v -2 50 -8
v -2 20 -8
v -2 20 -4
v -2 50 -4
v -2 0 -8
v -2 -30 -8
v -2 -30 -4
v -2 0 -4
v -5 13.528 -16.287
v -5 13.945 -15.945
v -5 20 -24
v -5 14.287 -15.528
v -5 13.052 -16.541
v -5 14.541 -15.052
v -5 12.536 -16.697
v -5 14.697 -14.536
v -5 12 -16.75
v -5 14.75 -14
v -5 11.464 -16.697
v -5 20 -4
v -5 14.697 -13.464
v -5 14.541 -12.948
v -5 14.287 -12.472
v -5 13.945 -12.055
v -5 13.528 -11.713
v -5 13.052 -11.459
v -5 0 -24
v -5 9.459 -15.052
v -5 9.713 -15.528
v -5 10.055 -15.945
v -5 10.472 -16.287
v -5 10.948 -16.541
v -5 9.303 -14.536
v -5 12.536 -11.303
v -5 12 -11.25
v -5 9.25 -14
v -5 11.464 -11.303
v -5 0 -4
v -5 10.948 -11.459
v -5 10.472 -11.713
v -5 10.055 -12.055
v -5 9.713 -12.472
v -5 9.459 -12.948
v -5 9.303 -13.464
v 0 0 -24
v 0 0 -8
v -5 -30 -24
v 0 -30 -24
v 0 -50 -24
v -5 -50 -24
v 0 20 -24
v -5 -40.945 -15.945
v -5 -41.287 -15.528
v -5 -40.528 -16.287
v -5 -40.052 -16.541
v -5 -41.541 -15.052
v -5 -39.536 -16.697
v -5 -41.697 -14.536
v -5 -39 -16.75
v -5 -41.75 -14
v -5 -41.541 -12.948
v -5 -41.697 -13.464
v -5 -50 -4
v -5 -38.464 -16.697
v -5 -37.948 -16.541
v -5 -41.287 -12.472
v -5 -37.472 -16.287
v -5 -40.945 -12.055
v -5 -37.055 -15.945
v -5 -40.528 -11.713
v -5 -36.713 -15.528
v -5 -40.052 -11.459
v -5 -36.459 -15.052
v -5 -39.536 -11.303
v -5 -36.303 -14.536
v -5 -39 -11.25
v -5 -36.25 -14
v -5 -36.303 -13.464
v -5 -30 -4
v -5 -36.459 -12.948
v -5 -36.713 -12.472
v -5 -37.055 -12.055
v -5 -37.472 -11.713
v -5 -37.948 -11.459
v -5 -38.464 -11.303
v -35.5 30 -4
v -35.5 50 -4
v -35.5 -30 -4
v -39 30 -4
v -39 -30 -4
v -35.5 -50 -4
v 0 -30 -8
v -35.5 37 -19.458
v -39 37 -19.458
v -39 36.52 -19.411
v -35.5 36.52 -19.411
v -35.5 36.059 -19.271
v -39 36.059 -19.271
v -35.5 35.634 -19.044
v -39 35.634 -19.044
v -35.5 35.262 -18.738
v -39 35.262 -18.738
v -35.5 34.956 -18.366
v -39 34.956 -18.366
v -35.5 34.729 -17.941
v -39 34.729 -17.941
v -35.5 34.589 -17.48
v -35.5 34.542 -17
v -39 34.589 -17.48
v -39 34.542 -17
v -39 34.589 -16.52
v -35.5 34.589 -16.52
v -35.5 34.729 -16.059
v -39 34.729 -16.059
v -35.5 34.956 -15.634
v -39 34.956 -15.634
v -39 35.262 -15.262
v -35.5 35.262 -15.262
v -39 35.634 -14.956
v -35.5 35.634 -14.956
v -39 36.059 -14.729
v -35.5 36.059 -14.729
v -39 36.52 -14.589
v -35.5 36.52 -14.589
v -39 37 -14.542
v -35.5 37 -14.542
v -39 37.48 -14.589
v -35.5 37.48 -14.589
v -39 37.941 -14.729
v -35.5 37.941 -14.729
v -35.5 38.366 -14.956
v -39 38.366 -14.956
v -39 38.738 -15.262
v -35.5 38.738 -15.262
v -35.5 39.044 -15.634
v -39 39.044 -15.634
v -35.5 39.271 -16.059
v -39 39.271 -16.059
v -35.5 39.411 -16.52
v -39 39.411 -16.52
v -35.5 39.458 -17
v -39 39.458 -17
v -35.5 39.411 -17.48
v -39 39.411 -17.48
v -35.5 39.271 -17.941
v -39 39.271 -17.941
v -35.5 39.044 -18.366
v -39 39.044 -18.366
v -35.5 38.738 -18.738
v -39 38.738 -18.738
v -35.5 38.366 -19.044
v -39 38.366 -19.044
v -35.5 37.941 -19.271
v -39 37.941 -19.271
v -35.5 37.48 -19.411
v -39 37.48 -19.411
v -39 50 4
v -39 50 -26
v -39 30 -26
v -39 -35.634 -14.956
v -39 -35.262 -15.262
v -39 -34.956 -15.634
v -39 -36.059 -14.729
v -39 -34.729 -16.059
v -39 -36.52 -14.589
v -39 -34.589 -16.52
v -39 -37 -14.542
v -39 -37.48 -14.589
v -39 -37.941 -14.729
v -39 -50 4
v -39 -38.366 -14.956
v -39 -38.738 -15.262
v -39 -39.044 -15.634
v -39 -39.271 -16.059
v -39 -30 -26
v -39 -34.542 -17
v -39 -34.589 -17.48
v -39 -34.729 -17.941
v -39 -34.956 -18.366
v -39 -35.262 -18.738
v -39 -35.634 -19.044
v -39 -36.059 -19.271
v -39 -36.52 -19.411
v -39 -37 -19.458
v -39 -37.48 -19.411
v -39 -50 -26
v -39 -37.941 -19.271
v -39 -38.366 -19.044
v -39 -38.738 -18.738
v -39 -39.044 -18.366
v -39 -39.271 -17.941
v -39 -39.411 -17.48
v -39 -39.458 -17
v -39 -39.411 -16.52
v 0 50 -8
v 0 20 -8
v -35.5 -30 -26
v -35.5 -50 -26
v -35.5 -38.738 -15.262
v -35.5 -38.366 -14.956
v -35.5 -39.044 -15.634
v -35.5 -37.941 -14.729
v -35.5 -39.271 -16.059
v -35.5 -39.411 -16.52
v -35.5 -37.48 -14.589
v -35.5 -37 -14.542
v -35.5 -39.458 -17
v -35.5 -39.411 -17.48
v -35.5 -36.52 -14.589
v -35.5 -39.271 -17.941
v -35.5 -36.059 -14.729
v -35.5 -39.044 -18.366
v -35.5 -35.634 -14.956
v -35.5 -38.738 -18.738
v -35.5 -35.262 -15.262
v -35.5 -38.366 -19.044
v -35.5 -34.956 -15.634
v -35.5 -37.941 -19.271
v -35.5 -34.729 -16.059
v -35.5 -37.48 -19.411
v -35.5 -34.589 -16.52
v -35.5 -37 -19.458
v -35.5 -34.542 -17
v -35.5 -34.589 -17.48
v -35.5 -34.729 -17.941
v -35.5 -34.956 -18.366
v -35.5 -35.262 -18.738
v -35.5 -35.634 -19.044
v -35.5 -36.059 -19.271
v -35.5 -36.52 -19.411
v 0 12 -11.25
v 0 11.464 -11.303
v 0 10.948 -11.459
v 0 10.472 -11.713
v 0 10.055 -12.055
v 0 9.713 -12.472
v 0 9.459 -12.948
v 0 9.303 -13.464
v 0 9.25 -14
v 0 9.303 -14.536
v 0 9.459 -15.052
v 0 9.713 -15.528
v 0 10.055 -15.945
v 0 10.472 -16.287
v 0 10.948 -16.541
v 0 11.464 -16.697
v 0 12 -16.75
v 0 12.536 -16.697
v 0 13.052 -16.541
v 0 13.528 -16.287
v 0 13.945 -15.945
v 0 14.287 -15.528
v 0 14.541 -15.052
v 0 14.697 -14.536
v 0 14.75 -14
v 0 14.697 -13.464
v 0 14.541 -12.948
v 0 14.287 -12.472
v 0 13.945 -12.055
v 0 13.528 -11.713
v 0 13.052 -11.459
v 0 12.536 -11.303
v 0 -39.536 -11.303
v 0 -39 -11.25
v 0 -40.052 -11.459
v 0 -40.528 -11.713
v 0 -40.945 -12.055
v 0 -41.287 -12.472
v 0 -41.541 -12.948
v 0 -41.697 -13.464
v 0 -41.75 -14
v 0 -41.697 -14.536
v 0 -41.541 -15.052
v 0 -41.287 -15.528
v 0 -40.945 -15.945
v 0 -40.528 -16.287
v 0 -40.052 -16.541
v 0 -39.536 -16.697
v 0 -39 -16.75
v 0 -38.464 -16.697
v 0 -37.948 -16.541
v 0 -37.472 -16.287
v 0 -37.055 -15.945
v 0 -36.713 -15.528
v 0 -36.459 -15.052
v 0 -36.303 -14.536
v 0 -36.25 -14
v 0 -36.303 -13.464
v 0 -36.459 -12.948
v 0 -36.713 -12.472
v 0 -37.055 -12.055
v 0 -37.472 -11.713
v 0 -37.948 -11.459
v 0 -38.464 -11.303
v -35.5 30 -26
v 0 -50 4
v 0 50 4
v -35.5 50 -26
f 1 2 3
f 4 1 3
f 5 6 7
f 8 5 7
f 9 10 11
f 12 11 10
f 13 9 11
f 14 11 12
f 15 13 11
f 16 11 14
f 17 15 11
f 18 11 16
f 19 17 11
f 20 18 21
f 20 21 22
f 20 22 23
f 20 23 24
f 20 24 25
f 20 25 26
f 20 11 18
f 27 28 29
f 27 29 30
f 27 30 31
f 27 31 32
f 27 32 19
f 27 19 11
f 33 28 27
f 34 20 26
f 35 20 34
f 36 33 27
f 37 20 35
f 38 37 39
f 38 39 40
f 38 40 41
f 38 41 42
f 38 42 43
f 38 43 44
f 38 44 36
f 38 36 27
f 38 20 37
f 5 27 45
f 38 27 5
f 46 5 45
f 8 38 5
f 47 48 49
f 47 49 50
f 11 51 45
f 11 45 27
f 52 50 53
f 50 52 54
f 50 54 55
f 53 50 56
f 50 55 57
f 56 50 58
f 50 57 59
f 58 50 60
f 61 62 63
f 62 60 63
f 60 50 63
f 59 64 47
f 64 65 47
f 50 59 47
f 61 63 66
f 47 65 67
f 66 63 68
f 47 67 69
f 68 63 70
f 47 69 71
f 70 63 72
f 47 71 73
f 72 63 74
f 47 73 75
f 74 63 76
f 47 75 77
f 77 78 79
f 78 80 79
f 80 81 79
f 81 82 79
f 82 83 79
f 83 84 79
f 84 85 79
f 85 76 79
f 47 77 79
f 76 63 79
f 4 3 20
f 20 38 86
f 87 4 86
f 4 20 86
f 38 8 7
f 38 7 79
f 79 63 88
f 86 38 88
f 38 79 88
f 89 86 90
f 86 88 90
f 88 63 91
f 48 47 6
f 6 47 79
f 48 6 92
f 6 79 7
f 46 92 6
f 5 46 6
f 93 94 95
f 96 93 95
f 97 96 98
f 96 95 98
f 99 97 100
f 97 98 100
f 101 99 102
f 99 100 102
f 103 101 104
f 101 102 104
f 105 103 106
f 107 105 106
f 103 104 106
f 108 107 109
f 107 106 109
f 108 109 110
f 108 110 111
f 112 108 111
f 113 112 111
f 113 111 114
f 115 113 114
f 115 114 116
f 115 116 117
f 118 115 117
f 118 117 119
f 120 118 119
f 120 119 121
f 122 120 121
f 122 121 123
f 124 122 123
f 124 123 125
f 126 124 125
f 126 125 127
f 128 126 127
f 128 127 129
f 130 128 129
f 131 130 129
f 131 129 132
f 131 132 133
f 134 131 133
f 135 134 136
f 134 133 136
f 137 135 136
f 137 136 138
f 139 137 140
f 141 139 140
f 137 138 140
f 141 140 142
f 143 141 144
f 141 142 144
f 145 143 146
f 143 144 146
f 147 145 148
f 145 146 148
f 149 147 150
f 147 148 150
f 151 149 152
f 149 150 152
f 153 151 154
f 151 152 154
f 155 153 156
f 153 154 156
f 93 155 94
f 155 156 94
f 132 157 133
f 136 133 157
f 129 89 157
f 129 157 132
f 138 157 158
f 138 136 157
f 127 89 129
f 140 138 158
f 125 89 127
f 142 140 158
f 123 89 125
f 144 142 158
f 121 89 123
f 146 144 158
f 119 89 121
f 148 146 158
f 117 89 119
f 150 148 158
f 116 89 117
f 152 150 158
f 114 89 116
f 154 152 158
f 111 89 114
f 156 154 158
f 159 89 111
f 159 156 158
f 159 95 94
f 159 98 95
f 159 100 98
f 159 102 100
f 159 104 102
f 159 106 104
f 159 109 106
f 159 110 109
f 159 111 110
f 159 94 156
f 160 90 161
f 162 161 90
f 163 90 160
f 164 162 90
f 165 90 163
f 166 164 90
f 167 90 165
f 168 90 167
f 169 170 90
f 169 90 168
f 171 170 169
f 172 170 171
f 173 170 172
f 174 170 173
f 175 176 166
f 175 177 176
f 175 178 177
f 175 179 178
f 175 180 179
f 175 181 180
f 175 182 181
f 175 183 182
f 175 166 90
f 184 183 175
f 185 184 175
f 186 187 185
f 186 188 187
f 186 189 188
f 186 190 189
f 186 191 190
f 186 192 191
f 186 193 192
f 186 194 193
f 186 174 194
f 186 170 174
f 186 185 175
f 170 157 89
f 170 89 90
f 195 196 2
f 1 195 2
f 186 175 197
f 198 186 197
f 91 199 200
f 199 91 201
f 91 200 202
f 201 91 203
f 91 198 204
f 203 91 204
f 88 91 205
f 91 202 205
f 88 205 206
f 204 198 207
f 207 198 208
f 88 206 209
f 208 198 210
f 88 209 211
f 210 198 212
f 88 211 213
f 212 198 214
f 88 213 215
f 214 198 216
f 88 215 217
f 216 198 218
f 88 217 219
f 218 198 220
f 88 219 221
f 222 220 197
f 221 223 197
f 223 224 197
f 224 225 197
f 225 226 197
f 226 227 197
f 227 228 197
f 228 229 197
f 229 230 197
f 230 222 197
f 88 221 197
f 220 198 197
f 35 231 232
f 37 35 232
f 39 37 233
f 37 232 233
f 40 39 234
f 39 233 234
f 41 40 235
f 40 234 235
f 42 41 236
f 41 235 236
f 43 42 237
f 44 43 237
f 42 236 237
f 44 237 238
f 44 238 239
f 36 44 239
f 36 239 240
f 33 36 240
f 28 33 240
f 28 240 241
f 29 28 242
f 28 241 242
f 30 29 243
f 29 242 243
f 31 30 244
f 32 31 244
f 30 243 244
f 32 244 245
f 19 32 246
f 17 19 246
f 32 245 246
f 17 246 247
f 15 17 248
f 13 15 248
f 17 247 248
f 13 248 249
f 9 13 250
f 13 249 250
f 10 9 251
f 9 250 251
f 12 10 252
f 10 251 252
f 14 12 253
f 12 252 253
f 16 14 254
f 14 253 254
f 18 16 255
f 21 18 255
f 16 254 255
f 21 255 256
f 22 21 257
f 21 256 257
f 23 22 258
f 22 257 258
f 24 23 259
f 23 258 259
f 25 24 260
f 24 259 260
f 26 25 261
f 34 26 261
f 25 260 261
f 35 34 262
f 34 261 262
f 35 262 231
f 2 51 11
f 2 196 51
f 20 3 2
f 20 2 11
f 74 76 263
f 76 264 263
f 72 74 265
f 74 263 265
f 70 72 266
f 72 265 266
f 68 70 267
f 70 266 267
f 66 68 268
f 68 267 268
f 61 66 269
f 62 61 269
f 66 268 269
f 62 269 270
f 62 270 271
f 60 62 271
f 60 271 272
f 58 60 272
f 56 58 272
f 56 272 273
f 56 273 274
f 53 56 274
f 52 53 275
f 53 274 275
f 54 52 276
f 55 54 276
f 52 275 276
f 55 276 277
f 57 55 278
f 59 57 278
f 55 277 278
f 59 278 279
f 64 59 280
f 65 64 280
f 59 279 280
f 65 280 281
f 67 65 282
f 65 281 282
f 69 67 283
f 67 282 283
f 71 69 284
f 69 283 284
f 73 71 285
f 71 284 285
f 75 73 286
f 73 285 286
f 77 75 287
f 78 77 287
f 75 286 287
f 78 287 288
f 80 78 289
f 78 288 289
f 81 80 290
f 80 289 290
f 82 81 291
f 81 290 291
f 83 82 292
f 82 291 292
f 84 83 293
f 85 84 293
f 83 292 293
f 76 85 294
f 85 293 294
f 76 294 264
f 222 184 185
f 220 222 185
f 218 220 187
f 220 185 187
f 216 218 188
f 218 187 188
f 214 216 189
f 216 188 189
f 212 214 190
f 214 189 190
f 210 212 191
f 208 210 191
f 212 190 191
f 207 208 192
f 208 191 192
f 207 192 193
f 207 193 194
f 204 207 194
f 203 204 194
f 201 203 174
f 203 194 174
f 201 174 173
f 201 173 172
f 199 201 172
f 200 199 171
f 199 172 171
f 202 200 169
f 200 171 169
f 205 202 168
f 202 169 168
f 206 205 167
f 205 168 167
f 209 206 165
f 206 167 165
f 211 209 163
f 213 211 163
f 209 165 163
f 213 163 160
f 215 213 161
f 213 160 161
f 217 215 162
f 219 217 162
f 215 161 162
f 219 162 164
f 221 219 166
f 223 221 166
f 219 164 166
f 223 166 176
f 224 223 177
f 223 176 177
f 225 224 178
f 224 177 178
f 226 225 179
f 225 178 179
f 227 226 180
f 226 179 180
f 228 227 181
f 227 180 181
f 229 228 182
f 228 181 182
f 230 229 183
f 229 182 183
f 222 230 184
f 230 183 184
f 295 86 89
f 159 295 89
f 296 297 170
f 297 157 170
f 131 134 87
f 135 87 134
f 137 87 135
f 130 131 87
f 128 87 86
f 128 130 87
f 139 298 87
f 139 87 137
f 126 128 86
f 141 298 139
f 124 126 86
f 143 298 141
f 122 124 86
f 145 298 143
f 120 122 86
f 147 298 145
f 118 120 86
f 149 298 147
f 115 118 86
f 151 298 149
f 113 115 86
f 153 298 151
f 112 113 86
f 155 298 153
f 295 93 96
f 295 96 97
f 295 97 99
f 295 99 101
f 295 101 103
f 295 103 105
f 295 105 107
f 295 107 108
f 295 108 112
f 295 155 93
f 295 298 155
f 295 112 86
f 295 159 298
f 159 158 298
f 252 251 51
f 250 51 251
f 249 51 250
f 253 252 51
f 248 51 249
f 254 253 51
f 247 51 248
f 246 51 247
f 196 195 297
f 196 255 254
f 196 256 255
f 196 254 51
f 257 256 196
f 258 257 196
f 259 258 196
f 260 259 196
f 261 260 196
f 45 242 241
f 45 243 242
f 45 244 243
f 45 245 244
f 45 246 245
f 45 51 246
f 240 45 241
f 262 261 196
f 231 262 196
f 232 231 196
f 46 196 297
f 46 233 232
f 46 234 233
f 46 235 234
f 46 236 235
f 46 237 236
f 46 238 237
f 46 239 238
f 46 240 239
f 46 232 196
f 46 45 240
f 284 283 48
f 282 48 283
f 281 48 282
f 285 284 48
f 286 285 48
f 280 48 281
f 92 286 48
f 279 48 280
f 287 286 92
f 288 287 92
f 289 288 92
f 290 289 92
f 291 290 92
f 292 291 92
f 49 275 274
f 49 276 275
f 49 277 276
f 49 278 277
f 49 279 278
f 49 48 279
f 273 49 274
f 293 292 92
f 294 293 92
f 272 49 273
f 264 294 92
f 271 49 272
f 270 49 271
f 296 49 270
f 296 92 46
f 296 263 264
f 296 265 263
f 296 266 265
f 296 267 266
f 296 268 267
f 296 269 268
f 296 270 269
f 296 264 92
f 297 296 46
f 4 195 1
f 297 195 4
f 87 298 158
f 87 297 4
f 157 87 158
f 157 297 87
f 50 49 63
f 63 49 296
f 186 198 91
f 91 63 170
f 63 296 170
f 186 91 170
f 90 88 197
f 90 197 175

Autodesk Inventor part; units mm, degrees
ref_plane "YZ Plane" through (0, 0, 0) normal (1, 0, 0) x (0, 1, 0)
ref_plane "XZ Plane" through (0, 0, 0) normal (0, 1, 0) x (-1, 0, 0)
ref_plane "XY Plane" through (0, 0, 0) normal (0, 0, 1) x (1, 0, 0)
sketch "Skizze1" plane through (0, 0, 0) normal (0, 1, 0) x (-1, 0, 0)
  line L0 (0, 0) -> (0, 8)
  line L1 (0, 8) -> (2, 8)
  line L2 (2, 8) -> (2, 4)
  line L3 (2, 4) -> (39, 4)
  line L4 (39, 4) -> (39, 0)
  line L5 (0, 0) -> (13.2064, 0)
  line L6 (0, 0) -> (0, -8)
  line L7 (0, -8) -> (2, -8)
  line L8 (2, -8) -> (2, -4)
  line L9 (2, -4) -> (39, -4)
  line L10 (39, -4) -> (39, 0)
  dimension "d1" = 8
  dimension "d2" = 2
  dimension "d3" = 4
  dimension "d4" = 37
extrude "Extrusion1" add sketch "Skizze1" along normal mid plane 100
sketch "Skizze5" plane through (-39, -50, 4) normal (0, 0, 1) x (1, 0, 0)
  line L0 (0, 0) -> (0, 100) projected
  line L1 (0, 0) -> (3.5, 0)
  line L2 (3.5, 0) -> (3.5, 20)
  line L3 (3.5, 20) -> (0, 20)
  line L4 (0, 20) -> (0, 0)
  point P0 (39, 50)
  point P1 (0, 20.0912)
  dimension "d22" = 3.5
  dimension "d23" = 20
extrude "Extrusion3" add sketch "Skizze5" along normal blind 20 and the other way blind 30
sketch "Skizze6" plane through (-39, 50, 4) normal (0, 0, 1) x (1, 0, 0)
  line L0 (0, -80) -> (0, 0) projected
  line L1 (0, 0) -> (3.5, 0)
  line L2 (3.5, 0) -> (3.5, -20)
  line L3 (3.5, -20) -> (0, -20)
  line L4 (0, -20) -> (0, 0)
  point P0 (39, -50)
  point P1 (0, -19.9088)
  point P2 (0, -20)
  dimension "d26" = 20
  dimension "d32" = 3.5
extrude "Extrusion4" add sketch "Skizze6" along normal blind 20 and the other way blind 30
sketch "Esquisse11" plane through (-35.5, 30, -4) normal (1, 0, 0) x (0, 0, -1)
  line L0 (22, 20) -> (0, 20) projected
  line L1 (22, 20) -> (22, 0) projected
  line L2 (22, -60) -> (22, -80) projected
  point P0 (-4, -30)
  point P1 (13, 7)
  point P2 (13, -67)
  dimension "d57" = 13
  dimension "d58" = 74
  dimension "d59" = 9
  dimension "d60" = 9
hole "Perçage3" at (-35.5, 37, -17) at (-35.5, -37, -17) direction (-1, 0, 0) diameter 4.917 end through all thread size "M6x1" class "6H" standard "ISO Metric profile"
sketch "Esquisse21" plane through (-35.5, -50, 4) normal (1, 0, 0) x (0, 0, -1)
  line L0 (0, 100) -> (0, 80) projected
  line L1 (0, 20) -> (0, 80) projected
  line L2 (0, 20) -> (0, 0) projected
  line L3 (0, 100) -> (0, 0) projected
  line L4 (-36.3372, 0) -> (0, 0)
  line L5 (0, 0) -> (0, 115.7943)
  line L6 (0, 115.7943) -> (-36.3372, 115.7943)
  line L7 (-36.3372, 115.7943) -> (-36.3372, 0)
  point P0 (4, 50)
  point P1 (0, 20)
extrude "Extrusion15" cut sketch "Esquisse21" along normal mid plane 9999
sketch "Esquisse22" plane through (-2, -50, -4) normal (0, 0, -1) x (-1, 0, 0)
  line L0 (37, 15.4585) -> (37, 10.5415) projected
  line L1 (33.5, 10.5415) -> (33.5, 15.4585) projected
  line L2 (-2, 0) -> (3, 0)
  line L3 (3, 0) -> (3, 20)
  line L4 (3, 20) -> (-2, 20)
  line L5 (-2, 20) -> (-2, 0)
  line L6 (33.5, 0) -> (0, 0) projected
  line L7 (-2, 0) -> (-2, 100) projected
  point P0 (-2, 50)
  point P1 (0.5, 0)
  dimension "d92" = 5
  dimension "d93" = 0
  dimension "d94" = 0
extrude "Extrusion16" add sketch "Esquisse22" along normal blind 20
sketch "Esquisse23" plane through (-5, -50, -4) normal (-1, 0, 0) x (0, 0, 1)
  line L0 (0, 20) -> (-20, 20) projected
  line L1 (-20, 0) -> (-20, 20) projected
  point P0 (4, 50)
  point P1 (-10, 11)
  dimension "d104" = 9
  dimension "d105" = 10
hole "Perçage5" at (-5, -39, -14) direction (1, 0, 0) diameter 5.5 end through all clearance for "Vis à tête plate fraisée ISO 2009/7046" size "M5" standard "ISO"
sketch "Esquisse24" plane through (-35.5, -30, -4) normal (0, 0, -1) x (-1, 0, 0)
  line L0 (-35.5, 0) -> (-35.5, 80) projected
  line L1 (-35.5, 50) -> (-30.5, 50)
  line L2 (-30.5, 50) -> (-30.5, 30)
  line L3 (-30.5, 30) -> (-35.5, 30)
  line L4 (-35.5, 30) -> (-35.5, 50)
  line L5 (-30.5, 0) -> (-35.5, 0) projected
  point P0 (-35.5, 30)
  dimension "d106" = 5
  dimension "d107" = 20
  dimension "d108" = 30
extrude "Extrusion17" add sketch "Esquisse24" along normal blind 20
sketch "Esquisse25" plane through (-5, 0, -4) normal (-1, 0, 0) x (0, 0, 1)
  line L0 (-20, 0) -> (-20, 20) projected
  line L1 (0, 20) -> (-20, 20) projected
  point P0 (4, 0)
  point P1 (-10, 12)
  dimension "d118" = 10
  dimension "d119" = 8
hole "Perçage6" at (-5, 12, -14) direction (1, 0, 0) diameter 5.5 end through all clearance for "Vis à tête plate fraisée ISO 2009/7046" size "M5" standard "ISO"
properties part number "Befestigung Bremssattel"
